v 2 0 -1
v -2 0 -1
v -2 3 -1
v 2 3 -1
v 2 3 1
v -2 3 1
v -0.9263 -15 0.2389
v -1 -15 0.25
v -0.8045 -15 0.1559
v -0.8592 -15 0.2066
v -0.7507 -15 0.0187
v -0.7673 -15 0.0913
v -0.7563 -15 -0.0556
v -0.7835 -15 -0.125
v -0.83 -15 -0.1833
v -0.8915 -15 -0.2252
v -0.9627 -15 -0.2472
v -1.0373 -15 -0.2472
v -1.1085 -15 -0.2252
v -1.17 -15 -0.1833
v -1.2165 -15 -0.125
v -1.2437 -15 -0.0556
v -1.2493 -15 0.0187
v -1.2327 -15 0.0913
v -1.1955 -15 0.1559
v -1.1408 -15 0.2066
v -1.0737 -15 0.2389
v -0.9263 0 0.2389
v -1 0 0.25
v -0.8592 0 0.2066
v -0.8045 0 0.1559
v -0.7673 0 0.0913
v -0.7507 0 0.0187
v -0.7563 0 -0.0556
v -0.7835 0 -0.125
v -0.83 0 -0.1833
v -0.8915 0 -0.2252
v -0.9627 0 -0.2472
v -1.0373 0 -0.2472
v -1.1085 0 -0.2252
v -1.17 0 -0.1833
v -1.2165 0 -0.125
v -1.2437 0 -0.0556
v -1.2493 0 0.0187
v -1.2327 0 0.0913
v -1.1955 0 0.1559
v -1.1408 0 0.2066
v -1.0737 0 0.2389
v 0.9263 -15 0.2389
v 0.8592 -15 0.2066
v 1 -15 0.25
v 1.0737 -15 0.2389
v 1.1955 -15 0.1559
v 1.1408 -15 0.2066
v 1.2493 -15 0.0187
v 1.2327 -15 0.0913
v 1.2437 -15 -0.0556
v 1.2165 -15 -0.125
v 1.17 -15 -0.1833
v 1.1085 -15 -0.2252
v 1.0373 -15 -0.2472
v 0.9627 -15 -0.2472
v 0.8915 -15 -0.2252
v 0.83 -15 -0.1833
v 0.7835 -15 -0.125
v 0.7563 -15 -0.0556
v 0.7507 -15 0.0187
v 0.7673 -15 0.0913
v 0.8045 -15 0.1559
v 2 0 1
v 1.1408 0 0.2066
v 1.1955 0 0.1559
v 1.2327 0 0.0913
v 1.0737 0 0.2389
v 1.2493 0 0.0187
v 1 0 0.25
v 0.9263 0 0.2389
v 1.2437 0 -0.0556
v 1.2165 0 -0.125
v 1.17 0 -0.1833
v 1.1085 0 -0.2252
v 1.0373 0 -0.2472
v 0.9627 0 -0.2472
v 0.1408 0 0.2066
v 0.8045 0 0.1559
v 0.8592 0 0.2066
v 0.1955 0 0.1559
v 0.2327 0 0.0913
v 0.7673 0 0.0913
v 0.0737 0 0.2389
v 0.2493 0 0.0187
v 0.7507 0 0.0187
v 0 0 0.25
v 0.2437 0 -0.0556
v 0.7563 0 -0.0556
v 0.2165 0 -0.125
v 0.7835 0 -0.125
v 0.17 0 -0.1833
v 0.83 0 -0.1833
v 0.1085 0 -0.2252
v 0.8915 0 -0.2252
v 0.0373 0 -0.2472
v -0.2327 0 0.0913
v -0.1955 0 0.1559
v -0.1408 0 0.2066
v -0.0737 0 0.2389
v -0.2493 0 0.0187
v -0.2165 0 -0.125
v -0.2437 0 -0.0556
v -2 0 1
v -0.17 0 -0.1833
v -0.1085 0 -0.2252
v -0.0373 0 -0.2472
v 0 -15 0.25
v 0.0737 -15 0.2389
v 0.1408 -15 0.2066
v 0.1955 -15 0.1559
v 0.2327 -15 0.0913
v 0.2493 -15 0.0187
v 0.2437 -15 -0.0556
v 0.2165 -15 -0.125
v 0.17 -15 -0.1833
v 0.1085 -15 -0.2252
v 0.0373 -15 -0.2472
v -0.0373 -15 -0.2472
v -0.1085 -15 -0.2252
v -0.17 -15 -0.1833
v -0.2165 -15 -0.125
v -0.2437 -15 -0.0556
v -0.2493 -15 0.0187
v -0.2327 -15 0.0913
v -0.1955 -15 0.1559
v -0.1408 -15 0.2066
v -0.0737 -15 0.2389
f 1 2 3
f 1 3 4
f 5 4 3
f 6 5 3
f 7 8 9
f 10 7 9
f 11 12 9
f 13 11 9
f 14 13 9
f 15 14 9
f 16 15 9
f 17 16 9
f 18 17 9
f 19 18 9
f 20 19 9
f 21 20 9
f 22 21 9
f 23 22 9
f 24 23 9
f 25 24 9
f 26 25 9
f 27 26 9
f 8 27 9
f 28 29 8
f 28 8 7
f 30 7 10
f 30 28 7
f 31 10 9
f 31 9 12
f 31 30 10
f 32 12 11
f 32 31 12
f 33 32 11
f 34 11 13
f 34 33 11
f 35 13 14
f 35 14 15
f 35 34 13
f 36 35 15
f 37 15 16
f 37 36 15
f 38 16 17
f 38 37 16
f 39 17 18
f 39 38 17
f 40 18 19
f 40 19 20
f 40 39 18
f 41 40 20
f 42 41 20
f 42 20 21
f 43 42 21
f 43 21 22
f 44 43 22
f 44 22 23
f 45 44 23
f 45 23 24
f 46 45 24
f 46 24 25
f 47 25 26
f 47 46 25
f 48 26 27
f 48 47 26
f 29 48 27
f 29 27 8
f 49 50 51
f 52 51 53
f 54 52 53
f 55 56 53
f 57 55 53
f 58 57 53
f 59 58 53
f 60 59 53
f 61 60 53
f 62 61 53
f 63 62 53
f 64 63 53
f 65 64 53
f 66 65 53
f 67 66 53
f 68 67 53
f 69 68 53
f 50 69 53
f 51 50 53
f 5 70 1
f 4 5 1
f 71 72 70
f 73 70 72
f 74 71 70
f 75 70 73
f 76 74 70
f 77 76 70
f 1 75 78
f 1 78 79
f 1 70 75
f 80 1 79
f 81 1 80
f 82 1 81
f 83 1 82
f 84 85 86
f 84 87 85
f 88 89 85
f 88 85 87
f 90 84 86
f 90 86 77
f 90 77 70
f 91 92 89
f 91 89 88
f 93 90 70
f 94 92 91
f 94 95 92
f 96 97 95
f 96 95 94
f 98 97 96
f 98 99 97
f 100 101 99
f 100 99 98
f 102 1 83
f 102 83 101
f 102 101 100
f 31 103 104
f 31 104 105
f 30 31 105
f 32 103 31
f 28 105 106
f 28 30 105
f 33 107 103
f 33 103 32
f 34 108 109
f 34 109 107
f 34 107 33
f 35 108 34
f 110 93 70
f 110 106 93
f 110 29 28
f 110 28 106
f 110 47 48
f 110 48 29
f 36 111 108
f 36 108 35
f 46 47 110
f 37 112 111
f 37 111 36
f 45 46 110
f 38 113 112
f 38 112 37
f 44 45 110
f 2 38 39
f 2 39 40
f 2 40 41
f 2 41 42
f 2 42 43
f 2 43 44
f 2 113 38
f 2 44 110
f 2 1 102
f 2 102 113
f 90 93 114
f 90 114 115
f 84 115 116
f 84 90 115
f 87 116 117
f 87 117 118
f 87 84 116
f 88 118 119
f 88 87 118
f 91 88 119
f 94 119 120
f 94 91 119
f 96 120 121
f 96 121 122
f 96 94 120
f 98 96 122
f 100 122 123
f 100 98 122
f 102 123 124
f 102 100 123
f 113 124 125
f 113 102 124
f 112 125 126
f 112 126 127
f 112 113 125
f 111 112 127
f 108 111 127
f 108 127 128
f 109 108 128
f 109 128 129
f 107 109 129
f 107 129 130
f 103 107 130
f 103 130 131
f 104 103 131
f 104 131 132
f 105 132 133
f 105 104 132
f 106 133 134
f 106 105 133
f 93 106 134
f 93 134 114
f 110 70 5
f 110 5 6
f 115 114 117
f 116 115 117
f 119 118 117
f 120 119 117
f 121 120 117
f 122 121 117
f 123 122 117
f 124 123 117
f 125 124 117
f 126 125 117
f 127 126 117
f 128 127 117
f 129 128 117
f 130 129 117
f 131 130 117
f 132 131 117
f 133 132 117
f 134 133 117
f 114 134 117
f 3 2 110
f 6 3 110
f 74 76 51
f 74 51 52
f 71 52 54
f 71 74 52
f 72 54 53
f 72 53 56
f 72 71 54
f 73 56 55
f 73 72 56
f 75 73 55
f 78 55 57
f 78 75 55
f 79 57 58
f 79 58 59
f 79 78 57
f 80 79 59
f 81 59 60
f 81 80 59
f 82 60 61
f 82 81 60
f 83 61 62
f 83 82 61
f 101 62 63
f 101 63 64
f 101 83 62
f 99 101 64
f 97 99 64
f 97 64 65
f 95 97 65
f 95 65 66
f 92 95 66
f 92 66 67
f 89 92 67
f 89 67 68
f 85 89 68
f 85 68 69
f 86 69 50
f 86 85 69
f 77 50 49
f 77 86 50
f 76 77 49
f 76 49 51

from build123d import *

# Parameters (mm, degrees)
HEAD_DEPTH = 3
SKETCH3_R  = 0.25
PINS_DEPTH = 15


with BuildPart() as part:
    # Sketch2 → Head (new body)
    with BuildSketch(Plane(origin=(0, 0, 0), x_dir=(1, 0, 0), z_dir=(0, 1, 0))):
        Polygon((-2, 0), (-2, 1), (2, 1), (2, 0), (2, -1), (-2, -1), align=None)
    extrude(amount=HEAD_DEPTH)

    # Sketch3 → Pins (add)
    with BuildSketch(Plane(origin=(0, 0, 0), x_dir=(1, 0, 0), z_dir=(0, 1, 0))):
        with Locations(Location((0, 0, 0), (0, 0, 270))):
            Circle(SKETCH3_R)
        with Locations(Location((-1, 0, 0), (0, 0, 270))):
            Circle(SKETCH3_R)
        with Locations(Location((1, 0, 0), (0, 0, 270))):
            Circle(SKETCH3_R)
    extrude(amount=-PINS_DEPTH)


solid = part.part
